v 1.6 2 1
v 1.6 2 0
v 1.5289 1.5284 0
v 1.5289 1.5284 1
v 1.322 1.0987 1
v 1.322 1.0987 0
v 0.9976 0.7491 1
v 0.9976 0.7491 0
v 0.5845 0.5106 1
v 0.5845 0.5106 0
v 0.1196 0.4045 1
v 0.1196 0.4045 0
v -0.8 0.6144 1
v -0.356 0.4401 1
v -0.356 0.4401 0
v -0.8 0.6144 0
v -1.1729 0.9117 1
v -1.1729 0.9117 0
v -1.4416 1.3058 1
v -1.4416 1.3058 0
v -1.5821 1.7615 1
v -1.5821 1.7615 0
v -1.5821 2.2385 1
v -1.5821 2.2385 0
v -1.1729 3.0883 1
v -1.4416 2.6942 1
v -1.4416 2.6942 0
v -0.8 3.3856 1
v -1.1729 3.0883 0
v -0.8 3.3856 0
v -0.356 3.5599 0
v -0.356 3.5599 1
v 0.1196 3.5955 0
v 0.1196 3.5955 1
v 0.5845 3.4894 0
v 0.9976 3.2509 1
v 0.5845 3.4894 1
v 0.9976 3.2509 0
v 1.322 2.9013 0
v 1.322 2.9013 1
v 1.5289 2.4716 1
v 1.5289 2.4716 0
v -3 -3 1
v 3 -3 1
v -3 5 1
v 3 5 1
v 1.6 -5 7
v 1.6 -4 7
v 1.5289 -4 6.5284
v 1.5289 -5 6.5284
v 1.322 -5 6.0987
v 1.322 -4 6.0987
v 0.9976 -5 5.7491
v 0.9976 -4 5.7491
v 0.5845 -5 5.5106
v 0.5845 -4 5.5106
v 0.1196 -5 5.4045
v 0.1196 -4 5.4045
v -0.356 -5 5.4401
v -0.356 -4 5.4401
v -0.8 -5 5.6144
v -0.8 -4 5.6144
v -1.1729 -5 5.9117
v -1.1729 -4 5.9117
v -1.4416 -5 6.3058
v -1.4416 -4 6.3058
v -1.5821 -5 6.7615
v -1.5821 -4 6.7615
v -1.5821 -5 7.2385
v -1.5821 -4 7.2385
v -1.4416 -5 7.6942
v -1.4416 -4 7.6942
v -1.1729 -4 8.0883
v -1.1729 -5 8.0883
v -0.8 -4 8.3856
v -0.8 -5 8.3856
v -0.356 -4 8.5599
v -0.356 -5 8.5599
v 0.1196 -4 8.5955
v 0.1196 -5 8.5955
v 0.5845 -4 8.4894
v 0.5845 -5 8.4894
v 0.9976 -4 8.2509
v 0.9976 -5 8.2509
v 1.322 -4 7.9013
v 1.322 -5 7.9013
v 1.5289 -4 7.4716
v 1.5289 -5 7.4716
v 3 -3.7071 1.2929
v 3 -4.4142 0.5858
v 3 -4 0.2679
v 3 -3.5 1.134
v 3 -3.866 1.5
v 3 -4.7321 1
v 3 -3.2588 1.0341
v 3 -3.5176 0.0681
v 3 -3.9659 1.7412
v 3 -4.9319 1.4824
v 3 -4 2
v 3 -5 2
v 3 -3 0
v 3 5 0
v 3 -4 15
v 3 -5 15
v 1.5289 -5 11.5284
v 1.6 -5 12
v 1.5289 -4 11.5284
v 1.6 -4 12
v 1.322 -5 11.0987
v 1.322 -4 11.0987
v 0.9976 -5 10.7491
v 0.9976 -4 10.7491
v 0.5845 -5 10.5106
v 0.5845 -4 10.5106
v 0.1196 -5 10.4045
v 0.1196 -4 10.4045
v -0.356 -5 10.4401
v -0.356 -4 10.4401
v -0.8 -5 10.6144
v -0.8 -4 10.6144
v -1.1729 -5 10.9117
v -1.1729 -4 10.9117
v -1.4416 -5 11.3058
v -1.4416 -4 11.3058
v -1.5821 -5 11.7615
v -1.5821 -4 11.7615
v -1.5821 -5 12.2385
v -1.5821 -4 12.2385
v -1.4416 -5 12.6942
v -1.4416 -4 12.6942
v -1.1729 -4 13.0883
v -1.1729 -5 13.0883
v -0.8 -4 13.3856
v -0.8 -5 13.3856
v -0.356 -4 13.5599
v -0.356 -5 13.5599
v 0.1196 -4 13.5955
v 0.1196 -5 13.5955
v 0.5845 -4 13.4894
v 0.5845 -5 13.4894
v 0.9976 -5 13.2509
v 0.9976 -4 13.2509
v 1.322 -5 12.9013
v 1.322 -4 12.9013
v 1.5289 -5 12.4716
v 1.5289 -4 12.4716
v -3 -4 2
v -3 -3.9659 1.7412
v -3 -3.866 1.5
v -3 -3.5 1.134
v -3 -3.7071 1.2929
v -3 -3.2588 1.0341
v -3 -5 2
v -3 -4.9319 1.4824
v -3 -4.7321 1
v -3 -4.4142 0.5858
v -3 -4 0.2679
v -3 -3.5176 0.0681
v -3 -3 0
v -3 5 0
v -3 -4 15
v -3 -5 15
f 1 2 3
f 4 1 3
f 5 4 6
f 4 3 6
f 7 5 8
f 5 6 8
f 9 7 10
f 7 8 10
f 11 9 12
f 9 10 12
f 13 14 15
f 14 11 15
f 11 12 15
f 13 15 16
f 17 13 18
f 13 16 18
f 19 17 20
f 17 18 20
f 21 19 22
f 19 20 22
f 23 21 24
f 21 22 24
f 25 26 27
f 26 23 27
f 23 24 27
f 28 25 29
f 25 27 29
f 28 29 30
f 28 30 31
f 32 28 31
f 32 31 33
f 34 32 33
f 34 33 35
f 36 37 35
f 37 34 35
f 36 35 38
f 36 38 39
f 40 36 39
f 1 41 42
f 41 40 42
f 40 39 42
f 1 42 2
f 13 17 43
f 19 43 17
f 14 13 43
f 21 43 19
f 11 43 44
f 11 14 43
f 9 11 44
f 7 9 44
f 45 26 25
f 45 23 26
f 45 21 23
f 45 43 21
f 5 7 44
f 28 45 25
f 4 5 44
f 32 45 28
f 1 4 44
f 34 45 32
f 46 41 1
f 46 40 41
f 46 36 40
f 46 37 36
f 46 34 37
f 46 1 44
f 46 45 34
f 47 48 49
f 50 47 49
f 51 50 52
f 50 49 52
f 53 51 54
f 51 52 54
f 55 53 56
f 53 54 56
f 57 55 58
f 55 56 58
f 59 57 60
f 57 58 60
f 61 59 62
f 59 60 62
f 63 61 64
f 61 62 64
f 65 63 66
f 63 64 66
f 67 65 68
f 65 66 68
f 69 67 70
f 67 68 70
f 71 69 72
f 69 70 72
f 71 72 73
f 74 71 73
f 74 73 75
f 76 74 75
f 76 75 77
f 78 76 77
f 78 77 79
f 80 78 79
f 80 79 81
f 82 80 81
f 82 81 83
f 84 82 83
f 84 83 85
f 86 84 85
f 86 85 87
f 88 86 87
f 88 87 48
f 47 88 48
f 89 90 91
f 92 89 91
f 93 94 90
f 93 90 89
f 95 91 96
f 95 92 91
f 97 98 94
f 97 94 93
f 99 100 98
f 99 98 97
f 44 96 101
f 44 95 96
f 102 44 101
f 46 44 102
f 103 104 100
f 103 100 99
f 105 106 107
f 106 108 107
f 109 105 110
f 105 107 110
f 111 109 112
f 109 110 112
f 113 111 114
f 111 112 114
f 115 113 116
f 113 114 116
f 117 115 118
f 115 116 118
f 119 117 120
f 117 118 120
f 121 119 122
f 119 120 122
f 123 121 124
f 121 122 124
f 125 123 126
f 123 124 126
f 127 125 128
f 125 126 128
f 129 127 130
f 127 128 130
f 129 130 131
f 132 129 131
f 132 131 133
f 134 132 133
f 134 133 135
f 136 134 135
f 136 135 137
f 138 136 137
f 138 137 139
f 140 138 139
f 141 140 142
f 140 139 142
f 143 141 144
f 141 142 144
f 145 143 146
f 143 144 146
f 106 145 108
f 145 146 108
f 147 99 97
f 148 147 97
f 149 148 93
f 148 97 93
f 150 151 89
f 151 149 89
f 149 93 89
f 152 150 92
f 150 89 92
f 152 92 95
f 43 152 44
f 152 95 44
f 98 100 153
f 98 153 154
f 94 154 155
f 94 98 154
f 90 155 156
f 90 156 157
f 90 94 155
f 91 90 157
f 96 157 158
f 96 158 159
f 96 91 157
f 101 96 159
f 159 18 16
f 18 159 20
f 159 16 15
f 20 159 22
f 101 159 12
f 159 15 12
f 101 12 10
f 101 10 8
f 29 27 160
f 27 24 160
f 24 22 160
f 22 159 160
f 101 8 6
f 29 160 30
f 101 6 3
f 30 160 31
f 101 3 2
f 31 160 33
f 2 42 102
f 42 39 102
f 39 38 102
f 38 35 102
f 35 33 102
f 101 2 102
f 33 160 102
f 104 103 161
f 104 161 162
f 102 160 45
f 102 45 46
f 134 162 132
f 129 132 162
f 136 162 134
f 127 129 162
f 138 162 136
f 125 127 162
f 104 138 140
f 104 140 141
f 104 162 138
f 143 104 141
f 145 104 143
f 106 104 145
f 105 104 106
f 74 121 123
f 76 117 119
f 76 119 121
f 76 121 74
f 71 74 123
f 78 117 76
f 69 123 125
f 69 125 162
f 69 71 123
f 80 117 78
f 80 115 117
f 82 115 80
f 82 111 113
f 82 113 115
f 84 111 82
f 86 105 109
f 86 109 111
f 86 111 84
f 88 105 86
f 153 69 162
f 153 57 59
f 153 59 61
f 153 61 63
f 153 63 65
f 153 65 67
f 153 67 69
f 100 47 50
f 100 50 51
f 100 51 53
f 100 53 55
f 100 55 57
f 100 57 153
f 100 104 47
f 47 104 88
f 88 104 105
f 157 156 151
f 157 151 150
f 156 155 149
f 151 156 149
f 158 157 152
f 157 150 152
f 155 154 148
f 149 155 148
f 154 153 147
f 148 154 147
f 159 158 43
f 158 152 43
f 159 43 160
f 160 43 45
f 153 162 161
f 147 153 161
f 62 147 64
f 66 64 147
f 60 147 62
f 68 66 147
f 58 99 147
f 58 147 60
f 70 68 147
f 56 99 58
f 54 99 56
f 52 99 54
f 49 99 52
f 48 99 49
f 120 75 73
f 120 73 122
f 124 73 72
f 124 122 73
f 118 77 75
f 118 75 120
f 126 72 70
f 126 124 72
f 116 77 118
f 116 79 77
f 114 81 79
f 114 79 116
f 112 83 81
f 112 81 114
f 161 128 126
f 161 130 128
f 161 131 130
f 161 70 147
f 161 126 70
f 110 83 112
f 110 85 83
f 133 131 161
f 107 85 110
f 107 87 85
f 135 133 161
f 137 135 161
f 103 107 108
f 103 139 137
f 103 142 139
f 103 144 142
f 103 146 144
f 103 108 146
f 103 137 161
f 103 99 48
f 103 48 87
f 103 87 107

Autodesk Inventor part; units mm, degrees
ref_plane "YZ Plane" through (0, 0, 0) normal (1, 0, 0) x (0, 1, 0)
ref_plane "XZ Plane" through (0, 0, 0) normal (0, 1, 0) x (-1, 0, 0)
ref_plane "XY Plane" through (0, 0, 0) normal (0, 0, 1) x (1, 0, 0)
sketch "Sketch1" plane through (0, 0, 0) normal (0, 0, 1) x (1, 0, 0)
  line L0 (-3, 5) -> (3, 5)
  line L1 (3, 5) -> (3, -5)
  line L2 (3, -5) -> (-3, -5)
  line L3 (-3, -5) -> (-3, 5)
  line L4 (-3, 5) -> (3, -5) construction
  line L5 (3, 5) -> (-3, -5) construction
  circle A0 centre (0, 2) radius 1.6
  point P0 (0, 0)
  dimension "d0" = 10
  dimension "d1" = 6
  dimension "d3" = 3.2
  dimension "d4" = 3
extrude "Plate1" add sketch "Sketch1" along normal blind 1
sketch "Sketch2" plane through (3, -4, 0) normal (0, -1, 0) x (1, 0, 0)
  line L0 (-6, 0) -> (0, 0)
  line L1 (0, 0) -> (0, 15)
  line L2 (0, 15) -> (-6, 15)
  line L3 (-6, 15) -> (-6, 0)
edge flange "Flange1" height 15 angle 90 thickness 1 bend radius 1 thickness toward (0, -1, 0) relief tear relief width 1 relief depth 0.5 edges at (0, -5, 1) wall of the first edge with corners at (-3, -4, 0) (3, -4, 0) (3, -4, 15) (-3, -4, 15)
bend "Bend1"
corner "Corner1"
sketch "Sketch3" plane through (-3, -4, 15) normal (0, 1, 0) x (1, 0, 0)
  circle A0 centre (3, 3) radius 1.6
  circle A1 centre (3, 8) radius 1.6
  line L0 (0, 0) -> (6, 0) projected
  point P0 (3, 15)
  point P1 (3, 0)
  dimension "d15" = 3.2
  dimension "d16" = 3.2
  dimension "d17" = 5
  dimension "d18" = 3
extrude "Cut1" cut sketch "Sketch3" against normal blind 1
equation "\"d19\" = 厚度"
equation "\"d2\" = 厚度"
equation "\"d5\" = 折彎離隙寬度"
equation "\"d6\" = 折彎離隙深度"
equation "\"d7\" = 最小剩餘"
equation "\"d8\" = 轉移半徑"
equation "\"d11\" = 折彎半徑"
equation "\"d12\" = 轉角離隙大小"
equation "\"d13\" = 間隙大小"
equation "\"d14\" = Jacobi半徑大小"
equation "\"折彎半徑\" = 厚度"
equation "\"折彎離隙寬度\" = 厚度"
equation "\"折彎離隙深度\" = 0.5 * 厚度"
equation "\"轉角離隙大小\" = 4 * 厚度"
equation "\"最小剩餘\" = 2 * 厚度"
equation "\"轉移半徑\" = 折彎半徑"
equation "\"Jacobi半徑大小\" = 折彎半徑"
equation "\"間隙大小\" = 厚度"
equation "\"厚度\" = 1"
properties part number "connector2_cooler"
